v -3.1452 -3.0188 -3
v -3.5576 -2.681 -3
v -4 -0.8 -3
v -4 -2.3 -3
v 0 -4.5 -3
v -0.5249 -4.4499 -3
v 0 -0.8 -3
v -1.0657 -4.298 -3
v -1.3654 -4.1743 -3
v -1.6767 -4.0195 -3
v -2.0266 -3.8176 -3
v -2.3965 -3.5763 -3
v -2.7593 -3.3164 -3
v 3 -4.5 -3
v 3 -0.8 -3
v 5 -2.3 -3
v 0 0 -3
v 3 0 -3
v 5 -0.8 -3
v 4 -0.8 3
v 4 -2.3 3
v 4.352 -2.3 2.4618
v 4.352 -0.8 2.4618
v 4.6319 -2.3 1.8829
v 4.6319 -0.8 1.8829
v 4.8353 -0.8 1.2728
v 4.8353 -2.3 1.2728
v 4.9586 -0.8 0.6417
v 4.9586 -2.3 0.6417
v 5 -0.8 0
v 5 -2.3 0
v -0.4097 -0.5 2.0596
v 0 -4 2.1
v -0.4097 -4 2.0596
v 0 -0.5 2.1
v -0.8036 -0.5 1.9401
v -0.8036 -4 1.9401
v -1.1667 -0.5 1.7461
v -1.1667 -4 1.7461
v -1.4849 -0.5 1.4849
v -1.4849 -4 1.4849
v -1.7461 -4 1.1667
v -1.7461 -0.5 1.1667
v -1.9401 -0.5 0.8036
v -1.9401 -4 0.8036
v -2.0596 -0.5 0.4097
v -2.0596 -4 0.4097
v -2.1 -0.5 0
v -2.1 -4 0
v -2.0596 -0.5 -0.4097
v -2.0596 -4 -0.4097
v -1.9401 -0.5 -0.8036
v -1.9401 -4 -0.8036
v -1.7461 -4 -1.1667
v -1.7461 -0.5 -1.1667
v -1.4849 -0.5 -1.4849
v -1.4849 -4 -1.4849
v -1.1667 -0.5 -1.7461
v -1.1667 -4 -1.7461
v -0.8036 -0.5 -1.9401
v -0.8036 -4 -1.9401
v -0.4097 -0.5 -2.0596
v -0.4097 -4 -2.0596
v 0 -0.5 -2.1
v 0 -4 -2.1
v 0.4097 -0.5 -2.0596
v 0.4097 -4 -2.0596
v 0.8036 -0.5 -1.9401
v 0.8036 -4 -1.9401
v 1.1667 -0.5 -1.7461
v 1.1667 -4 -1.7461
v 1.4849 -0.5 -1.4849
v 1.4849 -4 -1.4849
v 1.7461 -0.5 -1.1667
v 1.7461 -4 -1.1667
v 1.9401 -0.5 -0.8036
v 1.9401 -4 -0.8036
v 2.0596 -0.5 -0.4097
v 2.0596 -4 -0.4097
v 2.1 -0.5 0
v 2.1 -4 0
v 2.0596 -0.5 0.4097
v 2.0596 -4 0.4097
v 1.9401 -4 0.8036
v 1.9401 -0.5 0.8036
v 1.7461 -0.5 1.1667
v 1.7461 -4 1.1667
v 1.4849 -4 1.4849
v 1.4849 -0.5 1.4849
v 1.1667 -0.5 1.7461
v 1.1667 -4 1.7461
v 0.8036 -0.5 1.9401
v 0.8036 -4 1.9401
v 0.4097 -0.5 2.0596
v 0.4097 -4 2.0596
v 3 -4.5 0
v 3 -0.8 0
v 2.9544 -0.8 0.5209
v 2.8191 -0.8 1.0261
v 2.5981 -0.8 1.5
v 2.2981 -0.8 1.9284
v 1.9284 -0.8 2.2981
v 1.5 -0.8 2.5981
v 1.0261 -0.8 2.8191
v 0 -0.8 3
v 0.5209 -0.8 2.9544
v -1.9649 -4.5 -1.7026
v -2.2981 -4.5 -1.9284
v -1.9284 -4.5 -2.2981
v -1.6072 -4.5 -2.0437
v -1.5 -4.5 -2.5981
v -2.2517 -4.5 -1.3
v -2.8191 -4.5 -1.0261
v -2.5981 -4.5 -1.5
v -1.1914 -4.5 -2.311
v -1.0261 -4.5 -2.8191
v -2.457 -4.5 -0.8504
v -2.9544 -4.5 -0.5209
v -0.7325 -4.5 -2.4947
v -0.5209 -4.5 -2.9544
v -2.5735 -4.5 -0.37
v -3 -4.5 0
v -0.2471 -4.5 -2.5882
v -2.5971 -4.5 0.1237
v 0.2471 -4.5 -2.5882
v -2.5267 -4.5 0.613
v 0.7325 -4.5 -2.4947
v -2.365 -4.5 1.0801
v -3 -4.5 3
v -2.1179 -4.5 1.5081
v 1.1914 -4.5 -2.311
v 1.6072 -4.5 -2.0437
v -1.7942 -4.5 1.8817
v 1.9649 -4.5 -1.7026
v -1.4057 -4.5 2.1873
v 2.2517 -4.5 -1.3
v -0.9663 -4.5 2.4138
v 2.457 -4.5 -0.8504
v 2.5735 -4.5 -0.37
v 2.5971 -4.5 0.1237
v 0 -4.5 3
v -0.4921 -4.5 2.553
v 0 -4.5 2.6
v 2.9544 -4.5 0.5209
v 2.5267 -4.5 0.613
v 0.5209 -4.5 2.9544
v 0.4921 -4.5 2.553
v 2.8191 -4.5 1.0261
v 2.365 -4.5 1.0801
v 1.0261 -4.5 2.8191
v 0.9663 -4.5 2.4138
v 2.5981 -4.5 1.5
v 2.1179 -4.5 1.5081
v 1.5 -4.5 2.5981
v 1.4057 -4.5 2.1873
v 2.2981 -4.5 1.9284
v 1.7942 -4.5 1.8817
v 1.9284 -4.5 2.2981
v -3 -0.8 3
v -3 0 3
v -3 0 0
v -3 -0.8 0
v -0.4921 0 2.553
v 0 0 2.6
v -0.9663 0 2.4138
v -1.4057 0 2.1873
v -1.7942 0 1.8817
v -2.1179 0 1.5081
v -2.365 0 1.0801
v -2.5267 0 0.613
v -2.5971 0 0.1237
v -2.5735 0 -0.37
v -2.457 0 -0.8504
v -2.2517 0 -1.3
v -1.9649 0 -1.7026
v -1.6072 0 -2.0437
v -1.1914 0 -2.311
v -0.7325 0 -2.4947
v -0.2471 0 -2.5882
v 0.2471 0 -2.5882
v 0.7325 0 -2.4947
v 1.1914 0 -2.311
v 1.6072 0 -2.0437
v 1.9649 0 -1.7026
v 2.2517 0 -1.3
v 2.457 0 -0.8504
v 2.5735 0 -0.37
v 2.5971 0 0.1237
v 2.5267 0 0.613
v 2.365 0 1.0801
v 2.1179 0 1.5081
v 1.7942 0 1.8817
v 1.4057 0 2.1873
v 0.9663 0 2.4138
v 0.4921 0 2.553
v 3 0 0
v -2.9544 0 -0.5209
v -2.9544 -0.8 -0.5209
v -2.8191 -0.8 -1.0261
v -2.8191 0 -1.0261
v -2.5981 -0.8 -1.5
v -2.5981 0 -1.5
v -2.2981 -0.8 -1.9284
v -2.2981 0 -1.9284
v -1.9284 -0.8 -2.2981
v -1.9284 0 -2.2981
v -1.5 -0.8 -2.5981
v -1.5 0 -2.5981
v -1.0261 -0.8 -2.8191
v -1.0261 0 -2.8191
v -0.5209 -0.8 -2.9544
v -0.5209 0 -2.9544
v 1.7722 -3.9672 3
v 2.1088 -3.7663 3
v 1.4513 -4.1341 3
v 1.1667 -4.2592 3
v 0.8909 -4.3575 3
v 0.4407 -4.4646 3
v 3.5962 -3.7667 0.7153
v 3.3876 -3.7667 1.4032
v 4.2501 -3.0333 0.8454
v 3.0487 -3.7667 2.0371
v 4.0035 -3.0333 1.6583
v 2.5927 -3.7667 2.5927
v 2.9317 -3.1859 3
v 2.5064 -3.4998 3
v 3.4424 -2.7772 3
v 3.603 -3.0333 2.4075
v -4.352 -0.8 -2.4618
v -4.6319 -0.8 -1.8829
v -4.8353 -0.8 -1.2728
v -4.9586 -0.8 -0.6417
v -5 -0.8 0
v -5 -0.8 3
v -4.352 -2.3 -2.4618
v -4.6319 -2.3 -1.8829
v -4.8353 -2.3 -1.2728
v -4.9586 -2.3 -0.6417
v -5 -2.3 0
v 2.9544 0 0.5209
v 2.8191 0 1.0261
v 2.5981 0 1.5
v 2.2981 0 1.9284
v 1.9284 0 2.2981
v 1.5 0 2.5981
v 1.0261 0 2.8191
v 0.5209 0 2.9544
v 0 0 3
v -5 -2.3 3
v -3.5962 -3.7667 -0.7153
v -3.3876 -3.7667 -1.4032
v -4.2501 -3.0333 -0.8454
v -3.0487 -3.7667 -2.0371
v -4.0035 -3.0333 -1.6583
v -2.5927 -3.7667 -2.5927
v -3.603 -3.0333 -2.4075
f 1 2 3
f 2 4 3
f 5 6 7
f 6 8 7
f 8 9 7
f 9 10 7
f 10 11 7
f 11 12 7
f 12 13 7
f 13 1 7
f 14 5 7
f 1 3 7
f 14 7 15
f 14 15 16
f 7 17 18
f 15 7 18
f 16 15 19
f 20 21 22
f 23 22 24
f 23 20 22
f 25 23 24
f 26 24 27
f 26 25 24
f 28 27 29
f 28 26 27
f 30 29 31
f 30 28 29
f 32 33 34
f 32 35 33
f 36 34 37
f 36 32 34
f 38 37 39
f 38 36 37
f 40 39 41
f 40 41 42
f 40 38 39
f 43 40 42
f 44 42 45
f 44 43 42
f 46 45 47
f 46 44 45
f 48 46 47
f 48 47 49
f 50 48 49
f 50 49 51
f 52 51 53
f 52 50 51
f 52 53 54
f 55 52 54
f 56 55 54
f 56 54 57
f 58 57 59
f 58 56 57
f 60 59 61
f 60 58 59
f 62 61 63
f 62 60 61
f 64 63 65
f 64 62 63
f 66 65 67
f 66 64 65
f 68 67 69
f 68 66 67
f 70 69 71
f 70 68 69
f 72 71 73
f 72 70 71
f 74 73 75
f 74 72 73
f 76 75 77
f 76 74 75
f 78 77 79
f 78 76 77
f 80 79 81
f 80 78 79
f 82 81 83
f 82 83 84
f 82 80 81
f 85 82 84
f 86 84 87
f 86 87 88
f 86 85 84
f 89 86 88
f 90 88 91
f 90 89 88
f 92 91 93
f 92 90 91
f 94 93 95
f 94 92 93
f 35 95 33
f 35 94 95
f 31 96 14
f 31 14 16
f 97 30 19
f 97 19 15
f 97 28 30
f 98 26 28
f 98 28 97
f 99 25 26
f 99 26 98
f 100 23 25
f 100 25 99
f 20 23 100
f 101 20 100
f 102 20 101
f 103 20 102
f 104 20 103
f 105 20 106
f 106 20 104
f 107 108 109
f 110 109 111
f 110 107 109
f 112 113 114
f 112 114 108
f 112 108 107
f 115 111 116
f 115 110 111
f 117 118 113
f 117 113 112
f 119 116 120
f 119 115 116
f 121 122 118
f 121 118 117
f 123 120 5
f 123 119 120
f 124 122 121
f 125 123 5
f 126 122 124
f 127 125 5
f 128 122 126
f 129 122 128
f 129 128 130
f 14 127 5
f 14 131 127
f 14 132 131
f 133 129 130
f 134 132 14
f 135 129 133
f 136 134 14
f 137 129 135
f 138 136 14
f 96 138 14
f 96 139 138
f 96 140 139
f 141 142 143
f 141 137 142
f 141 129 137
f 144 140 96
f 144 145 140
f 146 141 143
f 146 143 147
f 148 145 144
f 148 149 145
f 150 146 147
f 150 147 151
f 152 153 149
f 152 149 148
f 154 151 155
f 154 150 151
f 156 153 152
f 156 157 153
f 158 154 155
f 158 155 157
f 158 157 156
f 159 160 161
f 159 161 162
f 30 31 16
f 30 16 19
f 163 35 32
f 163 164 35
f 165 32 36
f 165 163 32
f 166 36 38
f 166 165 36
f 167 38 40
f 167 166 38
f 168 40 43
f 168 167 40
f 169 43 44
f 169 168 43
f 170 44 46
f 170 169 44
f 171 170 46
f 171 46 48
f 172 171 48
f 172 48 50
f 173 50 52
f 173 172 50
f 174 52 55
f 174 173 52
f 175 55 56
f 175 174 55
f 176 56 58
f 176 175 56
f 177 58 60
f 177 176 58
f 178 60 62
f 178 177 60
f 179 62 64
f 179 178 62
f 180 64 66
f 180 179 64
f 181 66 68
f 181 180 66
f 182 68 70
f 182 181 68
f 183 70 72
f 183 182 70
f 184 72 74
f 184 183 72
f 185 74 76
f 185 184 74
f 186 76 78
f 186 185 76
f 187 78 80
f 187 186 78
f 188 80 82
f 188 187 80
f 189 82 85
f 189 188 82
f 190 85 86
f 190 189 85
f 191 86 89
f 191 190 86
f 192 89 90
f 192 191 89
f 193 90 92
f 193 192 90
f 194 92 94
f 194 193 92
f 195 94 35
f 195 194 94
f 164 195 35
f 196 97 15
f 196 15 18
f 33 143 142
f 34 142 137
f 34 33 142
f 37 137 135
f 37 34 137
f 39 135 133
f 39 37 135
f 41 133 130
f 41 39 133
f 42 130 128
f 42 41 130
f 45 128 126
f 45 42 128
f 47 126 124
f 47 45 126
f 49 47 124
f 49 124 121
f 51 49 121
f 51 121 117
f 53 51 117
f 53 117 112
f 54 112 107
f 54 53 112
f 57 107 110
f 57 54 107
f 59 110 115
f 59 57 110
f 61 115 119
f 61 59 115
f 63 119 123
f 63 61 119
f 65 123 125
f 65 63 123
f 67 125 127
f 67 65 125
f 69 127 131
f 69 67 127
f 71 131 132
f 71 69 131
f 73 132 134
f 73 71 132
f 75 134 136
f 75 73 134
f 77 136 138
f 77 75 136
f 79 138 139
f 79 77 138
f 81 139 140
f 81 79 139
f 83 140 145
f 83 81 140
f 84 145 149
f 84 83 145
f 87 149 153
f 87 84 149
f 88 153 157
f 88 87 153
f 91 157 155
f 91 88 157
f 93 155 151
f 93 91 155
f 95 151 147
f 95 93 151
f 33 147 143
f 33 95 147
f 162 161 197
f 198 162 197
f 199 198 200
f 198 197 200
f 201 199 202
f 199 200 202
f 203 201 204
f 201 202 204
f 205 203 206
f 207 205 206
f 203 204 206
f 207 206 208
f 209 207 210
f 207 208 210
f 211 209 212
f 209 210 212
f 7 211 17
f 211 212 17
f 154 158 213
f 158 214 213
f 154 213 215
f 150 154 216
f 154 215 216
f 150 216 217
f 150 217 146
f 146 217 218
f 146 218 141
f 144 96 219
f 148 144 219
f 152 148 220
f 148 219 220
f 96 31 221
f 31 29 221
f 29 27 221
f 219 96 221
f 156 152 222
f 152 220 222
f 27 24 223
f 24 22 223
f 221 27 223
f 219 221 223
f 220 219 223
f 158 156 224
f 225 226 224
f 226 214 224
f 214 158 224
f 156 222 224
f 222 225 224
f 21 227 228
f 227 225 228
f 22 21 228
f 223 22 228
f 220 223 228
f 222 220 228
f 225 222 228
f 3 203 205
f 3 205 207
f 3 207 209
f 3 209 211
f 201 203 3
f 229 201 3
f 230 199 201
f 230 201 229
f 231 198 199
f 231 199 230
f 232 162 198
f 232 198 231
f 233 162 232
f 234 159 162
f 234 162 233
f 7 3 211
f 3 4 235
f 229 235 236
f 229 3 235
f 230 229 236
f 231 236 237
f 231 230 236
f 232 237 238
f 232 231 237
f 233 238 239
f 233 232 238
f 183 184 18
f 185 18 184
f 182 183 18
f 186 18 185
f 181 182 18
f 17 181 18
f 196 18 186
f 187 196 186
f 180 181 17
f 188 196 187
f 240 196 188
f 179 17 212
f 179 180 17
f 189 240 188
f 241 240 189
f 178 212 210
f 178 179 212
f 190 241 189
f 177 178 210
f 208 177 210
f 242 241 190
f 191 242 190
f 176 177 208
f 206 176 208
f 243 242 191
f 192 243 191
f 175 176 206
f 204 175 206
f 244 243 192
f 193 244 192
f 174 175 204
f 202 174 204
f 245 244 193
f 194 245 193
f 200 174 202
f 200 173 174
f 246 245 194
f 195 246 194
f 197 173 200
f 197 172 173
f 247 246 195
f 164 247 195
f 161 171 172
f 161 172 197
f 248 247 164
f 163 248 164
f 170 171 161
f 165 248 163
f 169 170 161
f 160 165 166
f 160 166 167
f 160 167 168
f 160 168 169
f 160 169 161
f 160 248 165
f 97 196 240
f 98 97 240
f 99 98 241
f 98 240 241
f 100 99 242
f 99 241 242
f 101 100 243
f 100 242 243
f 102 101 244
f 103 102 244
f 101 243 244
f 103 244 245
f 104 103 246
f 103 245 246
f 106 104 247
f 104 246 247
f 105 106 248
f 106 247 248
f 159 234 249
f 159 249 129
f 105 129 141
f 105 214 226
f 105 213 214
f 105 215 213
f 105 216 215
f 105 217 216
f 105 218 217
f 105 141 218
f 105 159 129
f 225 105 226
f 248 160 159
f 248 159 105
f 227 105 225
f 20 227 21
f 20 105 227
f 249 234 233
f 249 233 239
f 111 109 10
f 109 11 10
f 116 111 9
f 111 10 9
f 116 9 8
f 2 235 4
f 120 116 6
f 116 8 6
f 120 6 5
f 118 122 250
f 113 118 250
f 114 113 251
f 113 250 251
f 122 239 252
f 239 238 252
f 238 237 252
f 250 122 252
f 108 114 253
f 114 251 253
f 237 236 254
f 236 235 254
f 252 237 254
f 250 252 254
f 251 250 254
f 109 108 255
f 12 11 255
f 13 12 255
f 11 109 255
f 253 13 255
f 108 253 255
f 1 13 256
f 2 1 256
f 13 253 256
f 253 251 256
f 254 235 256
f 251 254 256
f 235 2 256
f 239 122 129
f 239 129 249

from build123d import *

# Parameters (mm, degrees)
EXTRUDE_1_DEPTH     = 3
CUT_EXTRUDE_1_DEPTH = 0.8
CUT_EXTRUDE_2_DEPTH = 4.7


with BuildPart() as part:
    # Эскиз1 → Бобышка-Вытянуть1 (new body, symmetric)
    with BuildSketch(Plane.XY):
        Polygon((3, 0), (-3, 0), (-3, -0.8), (-5, -0.8), (-5, -4.5), (5, -4.5), (5, -0.8), (3, -0.8), align=None)
    extrude(amount=EXTRUDE_1_DEPTH, both=True)

    # Эскиз3 → Отверстие обработанное метчиком M51 (revolve, cut)
    with BuildSketch(Plane(origin=(0, 0, 0), x_dir=(0, 0, 1), z_dir=(1, 0, 0))):
        Polygon((0, 0), (0, 4.5), (2.6, 4.5), (2.1, 4), (2.1, 0.5), (2.6, 0), align=None)
    revolve(axis=Axis((0, 6.35, 0), (0, -1, 0)), mode=Mode.SUBTRACT)

    # Эскиз4 → Вырез-Вытянуть1 (cut)
    with BuildSketch(Plane(origin=(0, 0, 0), x_dir=(1, 0, 0), z_dir=(0, 1, 0))):
        with BuildLine():
            Line((-3, 3), (-3, 0))
            ThreePointArc((-3, 0), (-2.121320344, 2.121320344), (0, 3))
            Line((0, 3), (-3, 3))
        make_face()
        with BuildLine():
            Line((0, -3), (3, -3))
            Line((3, -3), (3, 0))
            ThreePointArc((3, 0), (2.121320344, -2.121320344), (0, -3))
        make_face()
    extrude(amount=-CUT_EXTRUDE_1_DEPTH, mode=Mode.SUBTRACT)

    # Эскиз5 → Вырез-Вытянуть2 (cut, through all)
    with BuildSketch(Plane(origin=(0, -0.8, 0), x_dir=(1, 0, 0), z_dir=(0, 1, 0))):
        with BuildLine():
            Line((-5, 0), (-5, 3))
            Line((-5, 3), (-4, 3))
            ThreePointArc((-4, 3), (-4.74341649, 1.58113883), (-5, 0))
        make_face()
        with BuildLine():
            Line((5, 0), (5, -3))
            Line((5, -3), (4, -3))
            ThreePointArc((4, -3), (4.74341649, -1.58113883), (5, 0))
        make_face()
    extrude(amount=-CUT_EXTRUDE_2_DEPTH, mode=Mode.SUBTRACT)

    # Вырез-По траектории1: sweep along a path in Эскиз7
    with BuildLine(Plane.XZ.offset(4.5)) as sweep_1_path:
        Line((0, 5), (-5, 5))
        Line((-5, 5), (-5, 0))
        ThreePointArc((-5, 0), (-3.535533906, -3.535533906), (0, -5))
        Line((0, -5), (5, -5))
        Line((5, -5), (5, 0))
        ThreePointArc((5, 0), (3.535533906, 3.535533906), (0, 5))
    # Эскиз6 → Вырез-По траектории1 (sweep, cut)
    with BuildSketch(Plane.XY.offset(3)):
        Polygon((-5, -2.3), (-5, -4.5), (-3, -4.5), align=None)
    sweep(path=sweep_1_path.line, transition=Transition.RIGHT, mode=Mode.SUBTRACT)


solid = part.part
